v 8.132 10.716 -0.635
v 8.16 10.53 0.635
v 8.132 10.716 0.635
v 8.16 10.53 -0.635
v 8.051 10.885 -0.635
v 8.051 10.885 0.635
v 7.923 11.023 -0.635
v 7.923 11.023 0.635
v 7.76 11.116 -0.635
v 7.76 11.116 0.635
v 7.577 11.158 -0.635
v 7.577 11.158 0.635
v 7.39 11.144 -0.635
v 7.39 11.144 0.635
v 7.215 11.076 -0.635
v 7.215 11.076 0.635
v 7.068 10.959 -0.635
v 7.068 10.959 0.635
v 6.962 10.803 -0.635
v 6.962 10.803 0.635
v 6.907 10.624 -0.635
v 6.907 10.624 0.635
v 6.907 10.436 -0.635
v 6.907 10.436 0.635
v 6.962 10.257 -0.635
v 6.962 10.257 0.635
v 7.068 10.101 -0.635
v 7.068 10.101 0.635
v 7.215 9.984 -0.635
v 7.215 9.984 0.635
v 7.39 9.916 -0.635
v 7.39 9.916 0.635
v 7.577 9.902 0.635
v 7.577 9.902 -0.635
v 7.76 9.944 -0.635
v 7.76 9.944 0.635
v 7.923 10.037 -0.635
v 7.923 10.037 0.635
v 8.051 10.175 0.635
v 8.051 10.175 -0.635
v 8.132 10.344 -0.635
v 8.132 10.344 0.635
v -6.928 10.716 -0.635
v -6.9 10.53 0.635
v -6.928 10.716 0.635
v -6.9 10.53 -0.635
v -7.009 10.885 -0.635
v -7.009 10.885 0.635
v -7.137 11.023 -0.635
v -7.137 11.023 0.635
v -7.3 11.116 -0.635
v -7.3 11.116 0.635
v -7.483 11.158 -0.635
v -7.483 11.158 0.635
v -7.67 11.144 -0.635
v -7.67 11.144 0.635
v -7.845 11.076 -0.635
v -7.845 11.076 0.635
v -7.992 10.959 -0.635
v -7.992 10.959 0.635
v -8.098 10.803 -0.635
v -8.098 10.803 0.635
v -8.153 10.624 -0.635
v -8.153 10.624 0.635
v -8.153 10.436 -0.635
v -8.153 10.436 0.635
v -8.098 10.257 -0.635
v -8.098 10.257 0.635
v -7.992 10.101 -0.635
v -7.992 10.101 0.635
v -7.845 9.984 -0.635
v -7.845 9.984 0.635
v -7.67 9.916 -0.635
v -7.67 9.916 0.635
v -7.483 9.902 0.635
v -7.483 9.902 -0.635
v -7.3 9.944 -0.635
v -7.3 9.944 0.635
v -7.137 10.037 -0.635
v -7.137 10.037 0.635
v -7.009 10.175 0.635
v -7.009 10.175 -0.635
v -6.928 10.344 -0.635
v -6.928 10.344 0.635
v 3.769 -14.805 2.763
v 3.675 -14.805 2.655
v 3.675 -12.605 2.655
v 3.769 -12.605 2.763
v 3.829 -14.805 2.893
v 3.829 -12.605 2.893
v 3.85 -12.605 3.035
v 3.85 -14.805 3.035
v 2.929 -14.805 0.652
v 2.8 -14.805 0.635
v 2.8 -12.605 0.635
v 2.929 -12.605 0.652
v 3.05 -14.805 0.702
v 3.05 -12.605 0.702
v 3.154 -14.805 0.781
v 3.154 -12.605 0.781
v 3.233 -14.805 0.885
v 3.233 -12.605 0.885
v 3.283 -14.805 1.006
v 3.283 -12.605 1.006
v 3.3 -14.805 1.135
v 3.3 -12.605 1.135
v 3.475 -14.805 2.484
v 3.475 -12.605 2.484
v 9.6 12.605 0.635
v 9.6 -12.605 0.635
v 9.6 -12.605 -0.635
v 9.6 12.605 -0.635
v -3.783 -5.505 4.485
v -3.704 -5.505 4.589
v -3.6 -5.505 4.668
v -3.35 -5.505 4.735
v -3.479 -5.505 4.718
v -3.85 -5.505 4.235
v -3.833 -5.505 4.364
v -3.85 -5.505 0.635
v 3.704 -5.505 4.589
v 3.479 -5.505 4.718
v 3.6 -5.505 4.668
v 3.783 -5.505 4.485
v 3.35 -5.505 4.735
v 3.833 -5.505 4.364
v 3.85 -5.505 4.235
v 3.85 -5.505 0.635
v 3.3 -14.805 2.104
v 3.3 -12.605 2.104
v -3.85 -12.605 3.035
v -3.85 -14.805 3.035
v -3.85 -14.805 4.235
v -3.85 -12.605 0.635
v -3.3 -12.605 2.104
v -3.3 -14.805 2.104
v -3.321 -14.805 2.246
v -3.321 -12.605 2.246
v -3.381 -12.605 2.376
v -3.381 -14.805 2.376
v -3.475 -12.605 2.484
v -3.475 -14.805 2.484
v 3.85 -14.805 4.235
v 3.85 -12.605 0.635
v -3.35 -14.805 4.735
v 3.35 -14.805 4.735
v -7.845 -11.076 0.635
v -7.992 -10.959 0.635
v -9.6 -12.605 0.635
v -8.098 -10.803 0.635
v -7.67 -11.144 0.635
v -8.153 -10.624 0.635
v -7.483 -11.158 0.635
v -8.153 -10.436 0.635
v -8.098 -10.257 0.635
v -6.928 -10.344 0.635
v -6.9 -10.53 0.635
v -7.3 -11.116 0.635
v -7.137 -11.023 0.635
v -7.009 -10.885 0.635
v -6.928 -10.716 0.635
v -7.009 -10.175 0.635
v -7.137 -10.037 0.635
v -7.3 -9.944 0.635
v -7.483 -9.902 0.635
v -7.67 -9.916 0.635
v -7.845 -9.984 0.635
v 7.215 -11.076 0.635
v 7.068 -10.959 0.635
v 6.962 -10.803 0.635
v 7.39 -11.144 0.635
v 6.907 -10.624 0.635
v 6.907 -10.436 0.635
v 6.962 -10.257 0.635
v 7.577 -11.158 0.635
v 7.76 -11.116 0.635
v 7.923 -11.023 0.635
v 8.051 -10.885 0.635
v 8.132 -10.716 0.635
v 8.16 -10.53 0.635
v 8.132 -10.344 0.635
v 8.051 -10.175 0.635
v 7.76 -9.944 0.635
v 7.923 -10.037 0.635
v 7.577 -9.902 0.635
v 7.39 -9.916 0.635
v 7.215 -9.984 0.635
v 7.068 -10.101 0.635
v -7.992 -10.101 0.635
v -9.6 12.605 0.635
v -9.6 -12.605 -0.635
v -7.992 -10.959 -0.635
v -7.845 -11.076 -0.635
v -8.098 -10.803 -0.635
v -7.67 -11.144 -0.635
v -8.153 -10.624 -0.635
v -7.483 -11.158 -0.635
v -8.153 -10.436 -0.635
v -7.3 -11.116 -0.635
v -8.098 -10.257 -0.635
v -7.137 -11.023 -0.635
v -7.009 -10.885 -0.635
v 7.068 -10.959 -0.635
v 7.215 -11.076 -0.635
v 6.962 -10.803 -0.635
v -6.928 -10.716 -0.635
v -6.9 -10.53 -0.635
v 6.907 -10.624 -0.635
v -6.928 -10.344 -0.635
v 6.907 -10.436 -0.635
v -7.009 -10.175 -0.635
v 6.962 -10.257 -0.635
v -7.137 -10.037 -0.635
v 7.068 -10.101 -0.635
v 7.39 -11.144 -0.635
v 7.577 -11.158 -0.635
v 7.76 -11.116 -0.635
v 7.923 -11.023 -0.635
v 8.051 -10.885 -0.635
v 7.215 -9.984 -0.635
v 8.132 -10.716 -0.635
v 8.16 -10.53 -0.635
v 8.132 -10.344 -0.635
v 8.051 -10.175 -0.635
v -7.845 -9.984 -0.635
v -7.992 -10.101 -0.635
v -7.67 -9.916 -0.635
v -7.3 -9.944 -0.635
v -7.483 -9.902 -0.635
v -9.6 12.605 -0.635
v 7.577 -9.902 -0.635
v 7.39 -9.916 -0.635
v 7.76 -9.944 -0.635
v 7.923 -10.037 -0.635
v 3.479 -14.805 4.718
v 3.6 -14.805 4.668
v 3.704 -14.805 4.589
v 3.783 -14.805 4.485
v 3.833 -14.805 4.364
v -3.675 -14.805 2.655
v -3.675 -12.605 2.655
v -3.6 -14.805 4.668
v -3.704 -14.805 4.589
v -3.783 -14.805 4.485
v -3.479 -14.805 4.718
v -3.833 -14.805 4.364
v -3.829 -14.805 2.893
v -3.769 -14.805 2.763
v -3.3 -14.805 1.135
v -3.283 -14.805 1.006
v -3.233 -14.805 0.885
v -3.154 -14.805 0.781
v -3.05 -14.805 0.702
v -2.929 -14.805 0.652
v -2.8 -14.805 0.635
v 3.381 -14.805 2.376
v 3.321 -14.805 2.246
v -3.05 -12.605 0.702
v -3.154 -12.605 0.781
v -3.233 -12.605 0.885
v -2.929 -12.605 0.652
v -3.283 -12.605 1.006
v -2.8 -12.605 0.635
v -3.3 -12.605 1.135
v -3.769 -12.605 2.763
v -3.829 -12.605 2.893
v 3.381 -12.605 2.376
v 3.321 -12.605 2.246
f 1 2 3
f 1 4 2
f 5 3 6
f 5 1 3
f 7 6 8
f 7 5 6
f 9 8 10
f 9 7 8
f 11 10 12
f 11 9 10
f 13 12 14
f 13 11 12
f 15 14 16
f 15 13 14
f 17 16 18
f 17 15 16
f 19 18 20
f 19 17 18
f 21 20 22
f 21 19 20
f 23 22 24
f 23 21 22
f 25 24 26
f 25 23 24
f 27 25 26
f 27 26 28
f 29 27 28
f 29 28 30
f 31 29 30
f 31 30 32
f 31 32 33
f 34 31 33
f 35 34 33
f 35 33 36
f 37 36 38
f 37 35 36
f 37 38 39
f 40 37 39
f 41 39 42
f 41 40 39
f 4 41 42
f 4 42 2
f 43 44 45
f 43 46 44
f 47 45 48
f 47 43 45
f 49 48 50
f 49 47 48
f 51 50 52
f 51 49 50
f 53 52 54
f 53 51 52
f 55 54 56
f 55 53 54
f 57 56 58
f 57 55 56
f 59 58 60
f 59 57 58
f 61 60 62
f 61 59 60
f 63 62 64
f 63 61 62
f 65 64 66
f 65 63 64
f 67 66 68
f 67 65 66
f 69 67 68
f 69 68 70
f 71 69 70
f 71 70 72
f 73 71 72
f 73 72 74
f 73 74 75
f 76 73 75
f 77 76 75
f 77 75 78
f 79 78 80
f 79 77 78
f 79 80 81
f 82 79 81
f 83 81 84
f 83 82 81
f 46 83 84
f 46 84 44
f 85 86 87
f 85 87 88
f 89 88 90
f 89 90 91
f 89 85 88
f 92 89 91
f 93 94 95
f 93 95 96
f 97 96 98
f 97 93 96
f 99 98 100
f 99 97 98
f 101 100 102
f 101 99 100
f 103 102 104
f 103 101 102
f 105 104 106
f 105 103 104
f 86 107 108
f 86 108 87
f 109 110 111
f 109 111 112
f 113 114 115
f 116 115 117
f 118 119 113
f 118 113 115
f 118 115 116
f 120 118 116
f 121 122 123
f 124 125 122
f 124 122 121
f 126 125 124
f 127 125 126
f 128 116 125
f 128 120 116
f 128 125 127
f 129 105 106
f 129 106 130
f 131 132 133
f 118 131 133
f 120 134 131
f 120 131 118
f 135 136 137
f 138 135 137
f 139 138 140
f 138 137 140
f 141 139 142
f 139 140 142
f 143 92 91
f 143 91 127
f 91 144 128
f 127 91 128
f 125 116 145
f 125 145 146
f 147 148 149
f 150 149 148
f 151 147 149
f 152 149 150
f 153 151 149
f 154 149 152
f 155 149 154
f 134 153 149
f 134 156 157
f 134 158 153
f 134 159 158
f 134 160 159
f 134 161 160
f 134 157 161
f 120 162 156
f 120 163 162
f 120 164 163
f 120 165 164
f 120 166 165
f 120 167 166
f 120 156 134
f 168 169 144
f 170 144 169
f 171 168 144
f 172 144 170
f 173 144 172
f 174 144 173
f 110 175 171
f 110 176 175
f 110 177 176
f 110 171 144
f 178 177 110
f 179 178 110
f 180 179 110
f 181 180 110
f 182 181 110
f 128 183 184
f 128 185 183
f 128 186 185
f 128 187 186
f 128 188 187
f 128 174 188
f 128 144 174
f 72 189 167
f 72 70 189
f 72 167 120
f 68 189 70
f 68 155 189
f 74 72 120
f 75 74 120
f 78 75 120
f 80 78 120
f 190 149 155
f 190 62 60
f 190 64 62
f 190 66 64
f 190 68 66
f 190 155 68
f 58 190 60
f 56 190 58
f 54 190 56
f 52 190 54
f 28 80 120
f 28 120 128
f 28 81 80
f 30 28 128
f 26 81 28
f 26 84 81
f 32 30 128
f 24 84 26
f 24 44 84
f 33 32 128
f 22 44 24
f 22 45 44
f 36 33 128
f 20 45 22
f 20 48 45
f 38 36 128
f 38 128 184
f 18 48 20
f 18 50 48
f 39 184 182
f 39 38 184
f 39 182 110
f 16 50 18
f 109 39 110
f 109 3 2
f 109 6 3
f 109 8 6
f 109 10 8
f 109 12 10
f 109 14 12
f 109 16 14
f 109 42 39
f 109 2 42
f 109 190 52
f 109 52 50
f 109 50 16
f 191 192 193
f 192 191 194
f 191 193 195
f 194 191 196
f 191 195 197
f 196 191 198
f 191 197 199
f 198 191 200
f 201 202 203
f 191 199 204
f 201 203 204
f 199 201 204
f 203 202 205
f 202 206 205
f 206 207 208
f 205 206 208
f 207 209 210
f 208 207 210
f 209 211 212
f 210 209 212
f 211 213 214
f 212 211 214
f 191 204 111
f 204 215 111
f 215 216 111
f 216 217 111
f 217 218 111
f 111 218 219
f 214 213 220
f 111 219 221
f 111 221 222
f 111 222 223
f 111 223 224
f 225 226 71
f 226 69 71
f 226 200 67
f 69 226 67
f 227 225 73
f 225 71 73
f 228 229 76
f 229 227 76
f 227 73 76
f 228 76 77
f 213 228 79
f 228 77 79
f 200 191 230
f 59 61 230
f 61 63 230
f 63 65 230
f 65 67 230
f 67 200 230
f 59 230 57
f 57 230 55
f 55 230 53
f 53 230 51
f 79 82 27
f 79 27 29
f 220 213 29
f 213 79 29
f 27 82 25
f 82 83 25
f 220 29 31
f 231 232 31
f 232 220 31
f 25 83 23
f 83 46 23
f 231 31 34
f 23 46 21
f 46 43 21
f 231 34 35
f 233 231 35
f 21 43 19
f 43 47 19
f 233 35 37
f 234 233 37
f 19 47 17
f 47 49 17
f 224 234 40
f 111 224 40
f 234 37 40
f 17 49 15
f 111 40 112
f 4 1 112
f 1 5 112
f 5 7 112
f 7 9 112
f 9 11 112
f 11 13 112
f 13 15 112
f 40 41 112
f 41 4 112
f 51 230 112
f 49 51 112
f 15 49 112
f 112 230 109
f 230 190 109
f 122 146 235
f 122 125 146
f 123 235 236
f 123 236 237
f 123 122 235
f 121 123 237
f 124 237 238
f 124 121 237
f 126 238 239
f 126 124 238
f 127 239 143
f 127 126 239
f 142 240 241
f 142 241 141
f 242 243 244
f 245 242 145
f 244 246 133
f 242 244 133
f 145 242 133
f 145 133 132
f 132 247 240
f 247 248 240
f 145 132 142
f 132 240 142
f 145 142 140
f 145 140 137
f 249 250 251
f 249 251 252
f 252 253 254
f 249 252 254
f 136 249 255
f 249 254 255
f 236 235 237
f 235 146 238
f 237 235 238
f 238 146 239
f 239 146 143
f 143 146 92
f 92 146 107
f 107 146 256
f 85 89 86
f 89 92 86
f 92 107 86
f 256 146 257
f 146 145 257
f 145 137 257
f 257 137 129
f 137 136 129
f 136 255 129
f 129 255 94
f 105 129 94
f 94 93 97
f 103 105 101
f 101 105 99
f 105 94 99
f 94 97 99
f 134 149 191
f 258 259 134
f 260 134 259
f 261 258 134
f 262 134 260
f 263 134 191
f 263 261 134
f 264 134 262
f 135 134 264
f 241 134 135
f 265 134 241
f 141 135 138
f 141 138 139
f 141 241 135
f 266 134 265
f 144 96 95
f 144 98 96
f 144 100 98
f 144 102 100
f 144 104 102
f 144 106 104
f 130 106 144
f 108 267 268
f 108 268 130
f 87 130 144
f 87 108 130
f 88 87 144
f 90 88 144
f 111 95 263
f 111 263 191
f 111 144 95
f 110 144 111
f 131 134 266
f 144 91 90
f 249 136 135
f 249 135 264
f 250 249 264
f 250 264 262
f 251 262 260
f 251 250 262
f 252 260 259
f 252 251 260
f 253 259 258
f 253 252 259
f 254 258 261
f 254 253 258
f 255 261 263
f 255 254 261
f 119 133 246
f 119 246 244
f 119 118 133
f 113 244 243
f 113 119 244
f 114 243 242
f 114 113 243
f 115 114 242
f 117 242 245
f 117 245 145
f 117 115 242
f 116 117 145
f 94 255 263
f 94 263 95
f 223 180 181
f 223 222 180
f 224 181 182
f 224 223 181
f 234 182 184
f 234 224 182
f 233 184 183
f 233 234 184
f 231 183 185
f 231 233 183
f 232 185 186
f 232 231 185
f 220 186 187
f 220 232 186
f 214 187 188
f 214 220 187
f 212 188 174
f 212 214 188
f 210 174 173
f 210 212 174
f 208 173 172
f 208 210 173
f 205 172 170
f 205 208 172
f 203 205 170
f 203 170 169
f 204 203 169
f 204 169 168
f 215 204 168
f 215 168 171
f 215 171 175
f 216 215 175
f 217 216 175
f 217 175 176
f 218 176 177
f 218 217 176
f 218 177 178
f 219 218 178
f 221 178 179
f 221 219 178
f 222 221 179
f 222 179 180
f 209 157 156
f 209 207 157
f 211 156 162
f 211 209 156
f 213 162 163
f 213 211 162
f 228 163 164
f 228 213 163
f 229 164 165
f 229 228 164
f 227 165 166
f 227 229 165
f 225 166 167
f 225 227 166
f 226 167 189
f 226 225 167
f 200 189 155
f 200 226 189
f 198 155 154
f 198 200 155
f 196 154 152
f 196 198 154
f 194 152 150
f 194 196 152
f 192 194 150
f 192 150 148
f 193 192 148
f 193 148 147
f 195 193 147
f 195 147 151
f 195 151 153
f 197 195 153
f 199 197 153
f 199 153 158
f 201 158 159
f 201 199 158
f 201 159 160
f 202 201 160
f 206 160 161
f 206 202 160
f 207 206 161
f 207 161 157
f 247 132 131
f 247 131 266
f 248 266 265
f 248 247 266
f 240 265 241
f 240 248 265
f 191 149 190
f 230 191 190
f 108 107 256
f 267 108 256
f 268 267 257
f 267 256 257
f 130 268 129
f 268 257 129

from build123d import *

# Parameters (mm, degrees)
SKETCH_W     = 19.2
SKETCH_H     = 25.21
SKETCH_R     = 0.63
PAD_DEPTH    = 0.635
SKETCH001_W  = 7.7
SKETCH001_H  = 9.3
PAD001_DEPTH = 4.1
FILLET_R     = 0.5
SKETCH002_W  = 8.550769
SKETCH002_H  = 4.773829
POCKET_DEPTH = 2.2


with BuildPart() as part:
    # Sketch → Pad (new body, symmetric)
    with BuildSketch(Plane.XY):
        Rectangle(SKETCH_W, SKETCH_H)
        with Locations((-7.53, 10.53)):
            Circle(SKETCH_R, mode=Mode.SUBTRACT)
        with Locations((7.53, 10.53)):
            Circle(SKETCH_R, mode=Mode.SUBTRACT)
        with Locations((7.53, -10.53)):
            Circle(SKETCH_R, mode=Mode.SUBTRACT)
        with Locations((-7.53, -10.53)):
            Circle(SKETCH_R, mode=Mode.SUBTRACT)
    extrude(amount=PAD_DEPTH, both=True)

    # Sketch001 → Pad001 (new body)
    with BuildSketch(Plane.XY.offset(0.635)):
        with Locations((0, -10.155)):
            Rectangle(SKETCH001_W, SKETCH001_H)
    extrude(amount=PAD001_DEPTH)

    # Fillet
    fillet_edges = [part.edges().sort_by_distance(p)[0] for p in [
        (-3.85, -10.155, 4.735),
        (3.85, -10.155, 4.735),
    ]]
    fillet(fillet_edges, radius=FILLET_R)

    # Sketch002 → Pocket (cut)
    with BuildSketch(Plane.XZ.offset(14.805)):
        with Locations((-0.025621, 2.603407)):
            Rectangle(SKETCH002_W, SKETCH002_H)
        with BuildLine():
            Line((-3.85, 4.735), (-3.85, 3.035))
            ThreePointArc((-3.85, 3.035), (-3.804161, 2.825865), (-3.675049, 2.655075))
            Line((-3.675049, 2.655075), (-3.474951, 2.483878))
            ThreePointArc((-3.3, 2.103953), (-3.345839, 2.313089), (-3.474951, 2.483878))
            Line((-3.3, 2.103953), (-3.3, 1.135))
            ThreePointArc((-3.3, 1.135), (-3.153553, 0.781447), (-2.8, 0.635))
            Line((-2.8, 0.635), (2.8, 0.635))
            ThreePointArc((2.8, 0.635), (3.153553, 0.781447), (3.3, 1.135))
            Line((3.3, 1.135), (3.3, 2.103953))
            ThreePointArc((3.474951, 2.483878), (3.345839, 2.313089), (3.3, 2.103953))
            Line((3.474951, 2.483878), (3.675049, 2.655075))
            ThreePointArc((3.675049, 2.655075), (3.804161, 2.825865), (3.85, 3.035))
            Line((3.85, 3.035), (3.85, 4.735))
            Line((3.85, 4.735), (-3.85, 4.735))
        make_face(mode=Mode.SUBTRACT)
    extrude(amount=-POCKET_DEPTH, mode=Mode.SUBTRACT)


solid = part.part
